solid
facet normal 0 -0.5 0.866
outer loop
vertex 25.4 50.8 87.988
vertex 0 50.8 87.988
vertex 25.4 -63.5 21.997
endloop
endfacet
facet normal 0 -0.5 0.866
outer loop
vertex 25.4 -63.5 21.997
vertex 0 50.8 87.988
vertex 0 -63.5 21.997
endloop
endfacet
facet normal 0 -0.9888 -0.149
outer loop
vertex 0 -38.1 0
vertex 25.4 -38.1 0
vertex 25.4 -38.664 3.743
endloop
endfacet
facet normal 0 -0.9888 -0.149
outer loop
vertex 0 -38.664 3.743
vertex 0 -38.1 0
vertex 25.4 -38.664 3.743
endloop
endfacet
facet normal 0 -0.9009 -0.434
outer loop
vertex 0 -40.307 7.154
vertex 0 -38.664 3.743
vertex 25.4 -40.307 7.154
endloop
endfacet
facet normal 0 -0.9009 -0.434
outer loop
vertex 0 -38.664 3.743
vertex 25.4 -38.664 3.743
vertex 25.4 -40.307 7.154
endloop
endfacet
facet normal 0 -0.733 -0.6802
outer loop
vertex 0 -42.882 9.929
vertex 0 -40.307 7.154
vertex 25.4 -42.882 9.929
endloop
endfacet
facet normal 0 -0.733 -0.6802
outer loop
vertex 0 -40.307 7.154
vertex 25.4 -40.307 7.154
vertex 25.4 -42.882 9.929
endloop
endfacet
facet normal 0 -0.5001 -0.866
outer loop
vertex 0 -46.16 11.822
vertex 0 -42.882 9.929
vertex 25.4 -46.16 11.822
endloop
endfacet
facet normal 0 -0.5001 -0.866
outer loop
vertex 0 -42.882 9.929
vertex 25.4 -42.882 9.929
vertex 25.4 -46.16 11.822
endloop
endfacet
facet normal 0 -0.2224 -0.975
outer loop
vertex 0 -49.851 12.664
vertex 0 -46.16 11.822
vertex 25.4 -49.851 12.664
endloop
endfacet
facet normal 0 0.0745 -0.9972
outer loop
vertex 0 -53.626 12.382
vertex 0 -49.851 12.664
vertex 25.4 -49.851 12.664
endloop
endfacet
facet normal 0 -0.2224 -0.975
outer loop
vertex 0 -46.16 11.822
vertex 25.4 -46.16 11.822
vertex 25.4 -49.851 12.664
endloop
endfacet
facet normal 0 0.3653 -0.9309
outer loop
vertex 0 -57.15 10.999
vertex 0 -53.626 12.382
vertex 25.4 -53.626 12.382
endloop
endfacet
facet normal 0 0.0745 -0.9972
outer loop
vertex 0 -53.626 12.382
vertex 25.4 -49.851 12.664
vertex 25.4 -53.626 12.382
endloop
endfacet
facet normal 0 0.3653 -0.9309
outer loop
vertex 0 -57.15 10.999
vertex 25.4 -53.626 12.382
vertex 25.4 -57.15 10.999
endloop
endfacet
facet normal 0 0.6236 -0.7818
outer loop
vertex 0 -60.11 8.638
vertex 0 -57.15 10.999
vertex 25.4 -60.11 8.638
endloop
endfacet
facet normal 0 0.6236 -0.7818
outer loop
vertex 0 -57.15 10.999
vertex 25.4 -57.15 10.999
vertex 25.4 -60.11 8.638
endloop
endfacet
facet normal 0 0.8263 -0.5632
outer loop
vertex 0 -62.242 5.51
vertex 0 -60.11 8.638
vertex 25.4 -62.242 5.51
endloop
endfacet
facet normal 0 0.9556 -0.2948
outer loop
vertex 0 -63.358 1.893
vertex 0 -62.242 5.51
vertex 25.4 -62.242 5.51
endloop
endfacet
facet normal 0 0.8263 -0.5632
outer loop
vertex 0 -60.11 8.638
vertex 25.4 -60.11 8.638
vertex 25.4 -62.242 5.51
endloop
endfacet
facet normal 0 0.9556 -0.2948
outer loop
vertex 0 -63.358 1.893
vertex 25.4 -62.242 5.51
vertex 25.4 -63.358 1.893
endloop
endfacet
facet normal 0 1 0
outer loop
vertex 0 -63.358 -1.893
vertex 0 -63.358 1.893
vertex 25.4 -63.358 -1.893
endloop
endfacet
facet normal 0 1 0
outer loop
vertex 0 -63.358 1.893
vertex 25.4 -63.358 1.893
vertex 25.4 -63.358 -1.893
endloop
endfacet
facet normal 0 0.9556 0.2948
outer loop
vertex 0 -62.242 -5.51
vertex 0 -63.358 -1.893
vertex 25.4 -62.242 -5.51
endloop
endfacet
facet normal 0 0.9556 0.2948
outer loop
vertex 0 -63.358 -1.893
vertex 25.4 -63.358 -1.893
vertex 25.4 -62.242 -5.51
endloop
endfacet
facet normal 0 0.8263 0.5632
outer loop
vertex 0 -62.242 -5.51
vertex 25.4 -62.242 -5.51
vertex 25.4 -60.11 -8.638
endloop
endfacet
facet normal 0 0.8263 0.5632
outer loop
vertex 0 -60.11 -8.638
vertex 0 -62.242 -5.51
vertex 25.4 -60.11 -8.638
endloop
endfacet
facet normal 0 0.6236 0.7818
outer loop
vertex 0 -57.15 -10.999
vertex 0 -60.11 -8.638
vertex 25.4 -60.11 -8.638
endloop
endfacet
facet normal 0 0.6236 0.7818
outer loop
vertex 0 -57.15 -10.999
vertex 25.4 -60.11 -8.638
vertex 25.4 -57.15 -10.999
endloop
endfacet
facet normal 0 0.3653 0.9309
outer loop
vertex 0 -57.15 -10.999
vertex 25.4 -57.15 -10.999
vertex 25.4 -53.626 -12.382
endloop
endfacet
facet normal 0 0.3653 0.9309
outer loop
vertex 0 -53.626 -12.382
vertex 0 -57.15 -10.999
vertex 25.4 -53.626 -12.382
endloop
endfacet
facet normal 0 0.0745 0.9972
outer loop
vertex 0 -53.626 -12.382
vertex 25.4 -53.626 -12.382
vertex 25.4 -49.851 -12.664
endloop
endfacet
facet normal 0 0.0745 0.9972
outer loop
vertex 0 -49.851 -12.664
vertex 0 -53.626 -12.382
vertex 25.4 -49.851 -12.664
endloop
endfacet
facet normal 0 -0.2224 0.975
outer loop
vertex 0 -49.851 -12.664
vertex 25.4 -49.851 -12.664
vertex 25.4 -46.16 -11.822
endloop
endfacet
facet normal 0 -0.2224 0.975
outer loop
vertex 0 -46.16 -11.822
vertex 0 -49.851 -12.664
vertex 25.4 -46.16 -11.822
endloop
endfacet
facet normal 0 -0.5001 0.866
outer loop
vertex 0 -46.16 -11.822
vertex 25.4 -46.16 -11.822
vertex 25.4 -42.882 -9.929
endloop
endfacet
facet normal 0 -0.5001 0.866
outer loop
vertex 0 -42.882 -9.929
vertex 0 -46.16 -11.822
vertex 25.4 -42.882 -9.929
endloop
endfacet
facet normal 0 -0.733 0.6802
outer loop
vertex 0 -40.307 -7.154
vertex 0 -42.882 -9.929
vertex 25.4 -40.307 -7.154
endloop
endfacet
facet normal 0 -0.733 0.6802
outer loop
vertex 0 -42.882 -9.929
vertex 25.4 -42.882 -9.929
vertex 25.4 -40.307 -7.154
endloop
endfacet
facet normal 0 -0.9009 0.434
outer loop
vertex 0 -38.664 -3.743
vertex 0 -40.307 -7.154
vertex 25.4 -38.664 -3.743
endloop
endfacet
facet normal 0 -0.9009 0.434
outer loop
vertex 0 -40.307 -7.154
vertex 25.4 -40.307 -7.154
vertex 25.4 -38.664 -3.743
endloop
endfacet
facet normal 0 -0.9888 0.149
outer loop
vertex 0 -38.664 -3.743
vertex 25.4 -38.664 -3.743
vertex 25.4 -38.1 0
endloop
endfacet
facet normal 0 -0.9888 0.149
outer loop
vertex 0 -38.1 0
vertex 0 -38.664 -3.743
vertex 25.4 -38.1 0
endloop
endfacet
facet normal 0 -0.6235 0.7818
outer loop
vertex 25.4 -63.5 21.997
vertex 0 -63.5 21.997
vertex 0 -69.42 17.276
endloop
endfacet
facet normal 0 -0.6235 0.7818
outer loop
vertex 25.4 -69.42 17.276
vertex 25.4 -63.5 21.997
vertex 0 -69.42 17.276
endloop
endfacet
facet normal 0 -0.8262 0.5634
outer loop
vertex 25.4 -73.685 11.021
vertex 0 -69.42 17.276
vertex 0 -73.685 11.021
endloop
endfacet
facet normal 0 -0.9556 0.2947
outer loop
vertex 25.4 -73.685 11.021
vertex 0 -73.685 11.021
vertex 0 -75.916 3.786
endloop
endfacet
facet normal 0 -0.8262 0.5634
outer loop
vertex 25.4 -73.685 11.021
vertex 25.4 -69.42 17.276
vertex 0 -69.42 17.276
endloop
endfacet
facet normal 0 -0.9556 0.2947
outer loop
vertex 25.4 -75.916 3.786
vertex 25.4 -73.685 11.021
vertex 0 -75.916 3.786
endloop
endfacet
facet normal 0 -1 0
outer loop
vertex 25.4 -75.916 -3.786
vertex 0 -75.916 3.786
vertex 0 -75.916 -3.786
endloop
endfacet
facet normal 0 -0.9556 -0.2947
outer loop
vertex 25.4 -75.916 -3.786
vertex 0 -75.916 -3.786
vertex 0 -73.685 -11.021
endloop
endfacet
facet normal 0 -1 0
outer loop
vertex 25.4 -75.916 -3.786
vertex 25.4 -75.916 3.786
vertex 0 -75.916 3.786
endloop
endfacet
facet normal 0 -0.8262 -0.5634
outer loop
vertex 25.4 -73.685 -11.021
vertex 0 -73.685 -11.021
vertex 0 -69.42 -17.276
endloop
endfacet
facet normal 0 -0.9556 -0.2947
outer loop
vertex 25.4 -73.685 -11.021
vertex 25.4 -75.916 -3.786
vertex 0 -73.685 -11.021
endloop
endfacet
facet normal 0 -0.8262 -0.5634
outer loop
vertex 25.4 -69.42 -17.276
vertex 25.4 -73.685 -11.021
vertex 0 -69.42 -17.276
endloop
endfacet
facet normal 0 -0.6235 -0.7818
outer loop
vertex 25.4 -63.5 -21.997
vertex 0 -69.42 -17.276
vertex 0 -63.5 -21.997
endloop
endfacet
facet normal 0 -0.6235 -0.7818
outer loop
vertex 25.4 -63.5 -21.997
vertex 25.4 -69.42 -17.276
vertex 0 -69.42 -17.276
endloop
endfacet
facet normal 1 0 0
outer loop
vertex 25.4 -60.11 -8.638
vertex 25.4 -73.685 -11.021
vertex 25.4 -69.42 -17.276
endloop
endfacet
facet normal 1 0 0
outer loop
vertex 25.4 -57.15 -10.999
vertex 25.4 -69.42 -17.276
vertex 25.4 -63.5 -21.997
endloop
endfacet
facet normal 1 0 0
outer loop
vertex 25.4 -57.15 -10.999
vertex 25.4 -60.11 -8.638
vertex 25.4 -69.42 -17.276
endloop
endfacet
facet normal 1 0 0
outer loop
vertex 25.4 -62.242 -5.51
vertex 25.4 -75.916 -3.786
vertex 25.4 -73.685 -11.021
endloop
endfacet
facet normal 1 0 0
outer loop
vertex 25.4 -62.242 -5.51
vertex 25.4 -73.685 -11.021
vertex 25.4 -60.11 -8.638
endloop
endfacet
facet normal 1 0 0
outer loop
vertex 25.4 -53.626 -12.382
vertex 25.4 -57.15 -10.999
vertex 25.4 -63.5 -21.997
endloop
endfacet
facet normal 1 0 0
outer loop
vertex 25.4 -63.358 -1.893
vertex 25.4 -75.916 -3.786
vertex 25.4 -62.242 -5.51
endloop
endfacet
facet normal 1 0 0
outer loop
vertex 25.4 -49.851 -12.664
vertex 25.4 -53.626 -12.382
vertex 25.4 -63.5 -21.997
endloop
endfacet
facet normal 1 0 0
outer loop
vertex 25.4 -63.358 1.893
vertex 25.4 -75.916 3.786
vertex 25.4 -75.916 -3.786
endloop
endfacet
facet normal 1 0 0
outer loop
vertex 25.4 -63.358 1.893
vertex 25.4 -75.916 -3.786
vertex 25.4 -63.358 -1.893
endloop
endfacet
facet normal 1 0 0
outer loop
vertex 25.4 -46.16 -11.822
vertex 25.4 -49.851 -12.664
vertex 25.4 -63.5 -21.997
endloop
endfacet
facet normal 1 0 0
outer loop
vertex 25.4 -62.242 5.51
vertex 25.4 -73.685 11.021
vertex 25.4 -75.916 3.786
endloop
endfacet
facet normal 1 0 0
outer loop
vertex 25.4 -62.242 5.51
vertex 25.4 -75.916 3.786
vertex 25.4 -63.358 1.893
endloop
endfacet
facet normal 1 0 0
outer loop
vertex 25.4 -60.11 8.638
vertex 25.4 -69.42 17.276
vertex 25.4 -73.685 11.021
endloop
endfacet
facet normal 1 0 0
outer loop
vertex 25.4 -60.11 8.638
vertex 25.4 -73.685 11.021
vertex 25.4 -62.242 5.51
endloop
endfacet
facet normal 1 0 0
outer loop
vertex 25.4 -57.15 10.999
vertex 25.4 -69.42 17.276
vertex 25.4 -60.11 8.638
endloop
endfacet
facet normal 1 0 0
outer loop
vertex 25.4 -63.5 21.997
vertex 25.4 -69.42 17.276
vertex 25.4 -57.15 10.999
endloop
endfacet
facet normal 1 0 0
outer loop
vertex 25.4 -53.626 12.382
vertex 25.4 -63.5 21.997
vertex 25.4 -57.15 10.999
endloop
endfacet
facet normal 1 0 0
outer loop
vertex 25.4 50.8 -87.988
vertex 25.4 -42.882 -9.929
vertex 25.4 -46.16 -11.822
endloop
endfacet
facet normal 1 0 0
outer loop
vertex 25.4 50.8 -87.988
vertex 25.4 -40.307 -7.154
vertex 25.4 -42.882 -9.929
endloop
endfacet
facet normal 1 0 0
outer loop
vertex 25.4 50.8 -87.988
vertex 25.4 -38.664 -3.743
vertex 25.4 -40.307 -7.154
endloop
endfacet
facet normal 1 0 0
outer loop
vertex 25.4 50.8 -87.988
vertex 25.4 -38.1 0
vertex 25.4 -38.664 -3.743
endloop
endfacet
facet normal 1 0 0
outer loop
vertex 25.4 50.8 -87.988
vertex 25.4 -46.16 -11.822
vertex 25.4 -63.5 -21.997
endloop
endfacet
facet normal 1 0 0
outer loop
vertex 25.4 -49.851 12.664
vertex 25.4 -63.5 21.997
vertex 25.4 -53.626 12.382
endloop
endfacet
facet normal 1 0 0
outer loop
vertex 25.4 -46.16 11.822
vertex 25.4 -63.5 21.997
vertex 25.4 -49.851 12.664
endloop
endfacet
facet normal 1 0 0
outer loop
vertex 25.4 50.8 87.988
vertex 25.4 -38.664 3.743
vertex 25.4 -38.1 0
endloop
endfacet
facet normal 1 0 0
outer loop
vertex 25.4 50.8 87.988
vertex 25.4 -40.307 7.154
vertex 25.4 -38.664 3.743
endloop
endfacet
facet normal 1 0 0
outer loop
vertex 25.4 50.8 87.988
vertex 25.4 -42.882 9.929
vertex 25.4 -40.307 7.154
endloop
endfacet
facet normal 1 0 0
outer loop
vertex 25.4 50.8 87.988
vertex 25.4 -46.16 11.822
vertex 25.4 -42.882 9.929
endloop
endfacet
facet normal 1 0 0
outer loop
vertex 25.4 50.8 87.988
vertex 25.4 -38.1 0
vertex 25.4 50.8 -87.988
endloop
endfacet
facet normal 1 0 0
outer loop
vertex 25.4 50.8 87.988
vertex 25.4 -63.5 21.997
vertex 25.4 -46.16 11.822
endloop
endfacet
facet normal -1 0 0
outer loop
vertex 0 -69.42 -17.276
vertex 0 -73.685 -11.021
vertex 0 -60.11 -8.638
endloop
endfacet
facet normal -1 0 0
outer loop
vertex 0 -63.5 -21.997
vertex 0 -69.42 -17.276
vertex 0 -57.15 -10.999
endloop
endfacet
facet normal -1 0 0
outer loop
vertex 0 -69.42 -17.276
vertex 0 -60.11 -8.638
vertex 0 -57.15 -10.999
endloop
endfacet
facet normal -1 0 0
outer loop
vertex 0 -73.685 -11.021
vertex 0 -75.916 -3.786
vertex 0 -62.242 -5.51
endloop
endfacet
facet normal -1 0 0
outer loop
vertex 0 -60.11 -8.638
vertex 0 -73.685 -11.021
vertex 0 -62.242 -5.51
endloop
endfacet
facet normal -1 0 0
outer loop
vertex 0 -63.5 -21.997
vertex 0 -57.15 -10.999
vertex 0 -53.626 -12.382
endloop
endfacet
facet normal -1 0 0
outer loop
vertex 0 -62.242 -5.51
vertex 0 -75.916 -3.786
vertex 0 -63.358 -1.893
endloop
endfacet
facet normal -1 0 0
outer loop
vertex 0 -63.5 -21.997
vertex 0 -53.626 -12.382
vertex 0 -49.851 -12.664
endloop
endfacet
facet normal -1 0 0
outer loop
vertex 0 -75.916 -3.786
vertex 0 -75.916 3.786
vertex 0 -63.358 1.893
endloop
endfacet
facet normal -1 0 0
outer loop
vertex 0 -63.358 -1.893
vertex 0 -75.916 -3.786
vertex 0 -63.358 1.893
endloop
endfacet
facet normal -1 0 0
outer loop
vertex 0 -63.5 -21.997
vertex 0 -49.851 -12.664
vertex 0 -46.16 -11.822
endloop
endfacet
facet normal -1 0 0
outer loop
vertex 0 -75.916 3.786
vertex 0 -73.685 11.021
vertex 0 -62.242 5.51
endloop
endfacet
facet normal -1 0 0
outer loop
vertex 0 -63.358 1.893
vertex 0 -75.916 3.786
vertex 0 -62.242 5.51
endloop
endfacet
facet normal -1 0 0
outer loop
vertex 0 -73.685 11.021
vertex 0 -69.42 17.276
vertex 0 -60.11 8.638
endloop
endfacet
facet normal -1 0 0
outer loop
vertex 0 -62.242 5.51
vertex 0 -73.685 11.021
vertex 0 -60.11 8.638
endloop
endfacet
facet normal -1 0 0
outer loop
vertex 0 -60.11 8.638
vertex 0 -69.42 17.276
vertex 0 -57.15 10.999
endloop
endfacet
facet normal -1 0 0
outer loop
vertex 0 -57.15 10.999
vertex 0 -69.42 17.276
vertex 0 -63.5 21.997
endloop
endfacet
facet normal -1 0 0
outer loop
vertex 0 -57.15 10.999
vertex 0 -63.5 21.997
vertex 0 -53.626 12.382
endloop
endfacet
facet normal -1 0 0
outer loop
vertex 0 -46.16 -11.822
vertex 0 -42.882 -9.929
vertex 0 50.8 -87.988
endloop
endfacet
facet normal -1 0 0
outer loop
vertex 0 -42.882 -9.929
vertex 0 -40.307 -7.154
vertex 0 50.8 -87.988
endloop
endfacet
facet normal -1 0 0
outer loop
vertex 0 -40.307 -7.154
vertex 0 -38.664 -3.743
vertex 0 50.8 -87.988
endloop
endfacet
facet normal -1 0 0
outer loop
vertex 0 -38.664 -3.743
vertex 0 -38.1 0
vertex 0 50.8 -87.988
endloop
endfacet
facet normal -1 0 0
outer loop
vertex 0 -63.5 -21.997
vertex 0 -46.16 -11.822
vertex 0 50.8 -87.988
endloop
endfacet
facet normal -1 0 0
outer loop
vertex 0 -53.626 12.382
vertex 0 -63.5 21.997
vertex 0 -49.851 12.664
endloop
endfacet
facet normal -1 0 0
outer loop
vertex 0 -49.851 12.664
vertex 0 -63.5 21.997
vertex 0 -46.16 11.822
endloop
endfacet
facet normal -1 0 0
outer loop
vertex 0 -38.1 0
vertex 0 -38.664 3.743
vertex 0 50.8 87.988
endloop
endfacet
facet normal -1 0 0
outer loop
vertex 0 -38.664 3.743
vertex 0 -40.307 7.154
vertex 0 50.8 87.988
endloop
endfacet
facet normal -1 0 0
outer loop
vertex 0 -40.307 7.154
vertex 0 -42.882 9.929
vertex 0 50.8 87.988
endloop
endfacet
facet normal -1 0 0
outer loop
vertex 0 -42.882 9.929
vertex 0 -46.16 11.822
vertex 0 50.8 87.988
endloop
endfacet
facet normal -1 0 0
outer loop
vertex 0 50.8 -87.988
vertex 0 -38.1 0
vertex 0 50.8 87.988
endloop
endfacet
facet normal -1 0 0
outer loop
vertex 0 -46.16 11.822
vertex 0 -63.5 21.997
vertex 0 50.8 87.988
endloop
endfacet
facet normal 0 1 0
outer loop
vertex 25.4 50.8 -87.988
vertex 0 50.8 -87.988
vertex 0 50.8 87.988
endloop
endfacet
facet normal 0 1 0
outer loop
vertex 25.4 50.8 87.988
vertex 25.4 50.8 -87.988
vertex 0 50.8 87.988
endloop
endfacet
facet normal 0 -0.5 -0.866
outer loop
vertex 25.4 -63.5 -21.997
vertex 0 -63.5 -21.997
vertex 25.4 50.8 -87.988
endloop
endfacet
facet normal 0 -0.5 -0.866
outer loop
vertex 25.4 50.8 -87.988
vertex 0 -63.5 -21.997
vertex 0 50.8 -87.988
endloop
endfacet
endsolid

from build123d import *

# Parameters (mm, degrees)
F1_DEPTH = 25.4
F2_R     = 25.4
F3_R     = 12.7
F4_DEPTH = 25.4


with BuildPart() as f1:
    # F0 (on Right) → F1 (new body)
    with BuildSketch(Plane.YZ):
        Polygon((50.8, -76.2), (50.8, 76.2), (50.8, 87.988181), (-101.6, 0), (50.8, -87.988181), align=None)
    extrude(amount=F1_DEPTH)

    # F2
    f2_edges = [f1.edges().sort_by_distance(p)[0] for p in [
        (12.7, -101.6, 0),
    ]]
    fillet(f2_edges, radius=F2_R)

    # F3 (on face) → F4 (cut)
    with BuildSketch(Plane.YZ.offset(25.4)):
        with Locations((-50.8, 0)):
            Circle(F3_R)
    extrude(amount=-F4_DEPTH, mode=Mode.SUBTRACT)


solid = f1.part
